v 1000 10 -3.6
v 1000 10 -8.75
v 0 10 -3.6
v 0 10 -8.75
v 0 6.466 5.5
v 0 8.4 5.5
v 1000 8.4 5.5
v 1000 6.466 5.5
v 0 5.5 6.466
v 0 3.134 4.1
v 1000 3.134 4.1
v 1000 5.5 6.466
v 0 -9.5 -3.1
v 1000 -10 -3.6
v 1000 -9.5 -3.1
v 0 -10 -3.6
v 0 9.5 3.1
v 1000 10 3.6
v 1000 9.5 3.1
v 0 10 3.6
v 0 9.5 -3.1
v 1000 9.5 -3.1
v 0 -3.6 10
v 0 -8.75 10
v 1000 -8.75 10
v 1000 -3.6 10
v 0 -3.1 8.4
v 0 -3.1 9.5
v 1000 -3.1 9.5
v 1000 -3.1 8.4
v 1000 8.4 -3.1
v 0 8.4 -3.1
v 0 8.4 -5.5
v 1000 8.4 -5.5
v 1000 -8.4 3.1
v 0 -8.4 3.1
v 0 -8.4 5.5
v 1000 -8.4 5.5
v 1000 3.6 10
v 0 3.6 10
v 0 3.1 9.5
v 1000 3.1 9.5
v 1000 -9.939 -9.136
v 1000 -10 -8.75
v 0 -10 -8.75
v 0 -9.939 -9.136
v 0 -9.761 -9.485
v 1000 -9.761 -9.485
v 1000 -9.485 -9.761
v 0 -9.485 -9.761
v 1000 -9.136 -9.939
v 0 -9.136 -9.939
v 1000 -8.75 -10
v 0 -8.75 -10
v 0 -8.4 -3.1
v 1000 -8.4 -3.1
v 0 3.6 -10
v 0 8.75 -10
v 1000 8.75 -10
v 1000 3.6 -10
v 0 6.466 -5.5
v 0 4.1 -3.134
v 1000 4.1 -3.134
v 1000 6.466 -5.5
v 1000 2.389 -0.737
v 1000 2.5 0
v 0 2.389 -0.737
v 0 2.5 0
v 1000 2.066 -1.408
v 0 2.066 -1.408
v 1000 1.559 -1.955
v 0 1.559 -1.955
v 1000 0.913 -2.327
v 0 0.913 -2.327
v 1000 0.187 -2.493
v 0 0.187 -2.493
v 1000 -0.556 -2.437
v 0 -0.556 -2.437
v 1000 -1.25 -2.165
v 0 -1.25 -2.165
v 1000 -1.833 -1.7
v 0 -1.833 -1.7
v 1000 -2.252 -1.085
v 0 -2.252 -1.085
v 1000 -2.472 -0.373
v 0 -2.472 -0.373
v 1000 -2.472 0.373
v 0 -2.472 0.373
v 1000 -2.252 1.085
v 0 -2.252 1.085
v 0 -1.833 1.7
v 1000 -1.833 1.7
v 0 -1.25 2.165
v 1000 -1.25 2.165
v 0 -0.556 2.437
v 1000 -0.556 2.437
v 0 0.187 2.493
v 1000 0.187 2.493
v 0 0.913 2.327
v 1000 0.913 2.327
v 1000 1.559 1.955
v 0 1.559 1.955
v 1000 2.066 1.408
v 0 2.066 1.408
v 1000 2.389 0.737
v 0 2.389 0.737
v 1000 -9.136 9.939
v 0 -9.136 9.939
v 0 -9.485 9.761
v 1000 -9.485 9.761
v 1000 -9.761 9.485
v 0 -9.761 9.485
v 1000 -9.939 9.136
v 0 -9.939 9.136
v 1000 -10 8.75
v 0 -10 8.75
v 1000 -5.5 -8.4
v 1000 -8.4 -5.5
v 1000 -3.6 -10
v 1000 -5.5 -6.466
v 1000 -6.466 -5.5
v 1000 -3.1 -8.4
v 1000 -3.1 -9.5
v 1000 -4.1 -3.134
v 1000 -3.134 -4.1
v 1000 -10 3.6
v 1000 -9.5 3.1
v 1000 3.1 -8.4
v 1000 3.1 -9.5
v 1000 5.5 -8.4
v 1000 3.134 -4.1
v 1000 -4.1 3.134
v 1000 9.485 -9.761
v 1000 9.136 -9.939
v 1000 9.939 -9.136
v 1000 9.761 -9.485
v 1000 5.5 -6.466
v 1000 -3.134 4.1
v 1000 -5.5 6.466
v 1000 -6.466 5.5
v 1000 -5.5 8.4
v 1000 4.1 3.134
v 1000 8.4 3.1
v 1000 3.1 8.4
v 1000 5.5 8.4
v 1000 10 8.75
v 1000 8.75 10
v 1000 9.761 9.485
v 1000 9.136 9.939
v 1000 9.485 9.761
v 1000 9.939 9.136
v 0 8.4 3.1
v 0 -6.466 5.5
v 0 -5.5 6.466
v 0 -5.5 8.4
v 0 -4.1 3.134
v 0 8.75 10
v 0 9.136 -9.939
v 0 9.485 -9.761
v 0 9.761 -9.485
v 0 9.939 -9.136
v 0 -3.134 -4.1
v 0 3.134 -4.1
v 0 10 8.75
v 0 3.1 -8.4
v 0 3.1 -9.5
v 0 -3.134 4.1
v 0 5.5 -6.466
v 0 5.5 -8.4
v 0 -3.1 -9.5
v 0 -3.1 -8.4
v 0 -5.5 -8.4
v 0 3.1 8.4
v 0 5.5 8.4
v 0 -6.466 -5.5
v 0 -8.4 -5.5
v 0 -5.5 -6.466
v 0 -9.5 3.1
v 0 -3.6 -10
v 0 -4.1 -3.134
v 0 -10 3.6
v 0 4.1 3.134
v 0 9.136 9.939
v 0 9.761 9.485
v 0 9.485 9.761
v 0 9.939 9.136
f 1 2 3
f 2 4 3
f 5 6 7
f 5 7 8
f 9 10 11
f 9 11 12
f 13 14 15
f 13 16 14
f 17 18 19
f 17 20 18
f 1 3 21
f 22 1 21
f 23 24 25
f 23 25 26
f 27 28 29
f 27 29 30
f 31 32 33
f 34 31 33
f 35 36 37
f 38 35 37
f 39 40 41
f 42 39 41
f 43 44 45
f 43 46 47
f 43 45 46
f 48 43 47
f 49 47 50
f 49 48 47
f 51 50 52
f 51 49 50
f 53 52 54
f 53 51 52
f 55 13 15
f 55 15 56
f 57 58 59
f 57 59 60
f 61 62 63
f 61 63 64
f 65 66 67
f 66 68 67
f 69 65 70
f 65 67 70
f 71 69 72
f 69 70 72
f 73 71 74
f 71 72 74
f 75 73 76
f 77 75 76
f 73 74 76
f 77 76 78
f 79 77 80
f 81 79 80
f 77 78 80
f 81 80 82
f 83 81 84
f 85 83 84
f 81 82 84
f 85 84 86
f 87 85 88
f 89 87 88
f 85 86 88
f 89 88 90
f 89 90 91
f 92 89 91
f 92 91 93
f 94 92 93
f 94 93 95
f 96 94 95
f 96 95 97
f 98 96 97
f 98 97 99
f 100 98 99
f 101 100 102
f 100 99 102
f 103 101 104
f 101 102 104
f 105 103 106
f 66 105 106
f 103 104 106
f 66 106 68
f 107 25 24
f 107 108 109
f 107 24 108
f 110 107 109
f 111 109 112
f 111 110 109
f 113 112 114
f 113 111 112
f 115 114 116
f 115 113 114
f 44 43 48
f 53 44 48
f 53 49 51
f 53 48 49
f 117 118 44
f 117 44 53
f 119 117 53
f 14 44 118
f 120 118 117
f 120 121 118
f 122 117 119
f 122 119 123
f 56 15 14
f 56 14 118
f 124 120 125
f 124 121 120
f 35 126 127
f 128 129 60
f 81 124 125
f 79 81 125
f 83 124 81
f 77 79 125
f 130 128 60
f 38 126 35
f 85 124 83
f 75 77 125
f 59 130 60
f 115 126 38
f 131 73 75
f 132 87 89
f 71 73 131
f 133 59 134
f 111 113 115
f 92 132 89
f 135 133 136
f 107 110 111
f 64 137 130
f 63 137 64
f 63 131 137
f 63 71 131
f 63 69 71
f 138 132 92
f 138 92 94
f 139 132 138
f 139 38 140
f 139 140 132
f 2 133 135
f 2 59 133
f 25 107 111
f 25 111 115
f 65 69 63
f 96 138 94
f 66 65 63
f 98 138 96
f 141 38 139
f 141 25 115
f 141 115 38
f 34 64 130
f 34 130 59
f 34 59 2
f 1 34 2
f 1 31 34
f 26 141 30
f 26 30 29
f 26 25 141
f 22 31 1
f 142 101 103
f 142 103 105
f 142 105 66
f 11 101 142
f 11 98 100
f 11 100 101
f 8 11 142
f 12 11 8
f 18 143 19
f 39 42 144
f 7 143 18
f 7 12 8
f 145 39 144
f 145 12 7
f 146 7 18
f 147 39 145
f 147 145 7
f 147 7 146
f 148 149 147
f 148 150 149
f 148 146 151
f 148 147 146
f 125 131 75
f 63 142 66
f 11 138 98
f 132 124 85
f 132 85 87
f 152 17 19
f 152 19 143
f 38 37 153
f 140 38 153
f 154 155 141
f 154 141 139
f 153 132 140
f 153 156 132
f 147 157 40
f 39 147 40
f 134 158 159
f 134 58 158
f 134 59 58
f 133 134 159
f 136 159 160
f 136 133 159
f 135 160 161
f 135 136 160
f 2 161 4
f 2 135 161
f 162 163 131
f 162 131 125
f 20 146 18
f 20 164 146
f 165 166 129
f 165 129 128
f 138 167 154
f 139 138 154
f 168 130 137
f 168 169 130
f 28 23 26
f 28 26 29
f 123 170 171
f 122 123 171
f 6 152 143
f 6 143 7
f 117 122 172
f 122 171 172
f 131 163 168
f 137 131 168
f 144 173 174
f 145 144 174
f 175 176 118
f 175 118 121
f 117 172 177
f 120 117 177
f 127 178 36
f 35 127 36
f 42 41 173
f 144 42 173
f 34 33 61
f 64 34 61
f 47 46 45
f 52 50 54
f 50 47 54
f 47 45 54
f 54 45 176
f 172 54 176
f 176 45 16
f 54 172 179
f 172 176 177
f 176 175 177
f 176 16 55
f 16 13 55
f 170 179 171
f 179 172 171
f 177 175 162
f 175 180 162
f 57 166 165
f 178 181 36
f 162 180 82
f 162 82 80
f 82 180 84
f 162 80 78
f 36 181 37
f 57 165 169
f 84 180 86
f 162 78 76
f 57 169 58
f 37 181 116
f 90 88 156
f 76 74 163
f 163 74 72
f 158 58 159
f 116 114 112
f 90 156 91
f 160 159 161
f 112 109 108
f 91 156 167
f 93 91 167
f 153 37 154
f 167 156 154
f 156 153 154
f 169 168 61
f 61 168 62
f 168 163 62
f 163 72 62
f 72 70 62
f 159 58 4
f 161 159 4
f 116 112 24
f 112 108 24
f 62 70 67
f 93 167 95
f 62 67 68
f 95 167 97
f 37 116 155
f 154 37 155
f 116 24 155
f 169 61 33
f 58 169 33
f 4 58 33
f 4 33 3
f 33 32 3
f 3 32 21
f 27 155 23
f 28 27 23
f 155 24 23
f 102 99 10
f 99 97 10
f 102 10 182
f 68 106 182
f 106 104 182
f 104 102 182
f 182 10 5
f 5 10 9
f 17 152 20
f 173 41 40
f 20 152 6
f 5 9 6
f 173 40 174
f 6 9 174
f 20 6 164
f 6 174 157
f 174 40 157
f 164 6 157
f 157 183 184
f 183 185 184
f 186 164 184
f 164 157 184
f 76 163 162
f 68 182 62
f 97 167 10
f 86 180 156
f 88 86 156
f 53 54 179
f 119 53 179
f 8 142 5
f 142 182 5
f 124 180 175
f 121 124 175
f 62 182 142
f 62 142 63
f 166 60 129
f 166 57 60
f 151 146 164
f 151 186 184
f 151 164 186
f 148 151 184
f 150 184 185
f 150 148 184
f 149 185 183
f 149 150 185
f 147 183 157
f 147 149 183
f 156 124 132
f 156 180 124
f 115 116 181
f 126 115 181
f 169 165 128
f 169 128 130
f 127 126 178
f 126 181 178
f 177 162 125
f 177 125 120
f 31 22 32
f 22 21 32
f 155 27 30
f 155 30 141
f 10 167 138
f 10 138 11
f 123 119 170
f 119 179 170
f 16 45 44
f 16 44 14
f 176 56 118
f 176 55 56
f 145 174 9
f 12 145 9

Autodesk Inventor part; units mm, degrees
ref_plane "YZ Plane" through (0, 0, 0) normal (1, 0, 0) x (0, 1, 0)
ref_plane "XZ Plane" through (0, 0, 0) normal (0, 1, 0) x (-1, 0, 0)
ref_plane "XY Plane" through (0, 0, 0) normal (0, 0, 1) x (1, 0, 0)
sketch "Sketch1" plane through (0, 0, 0) normal (1, 0, 0) x (0, 1, 0)
  circle A0 centre (0, 0) radius 2.5
  line L0 (0, 0) -> (10, 0)
  line L1 (10, -10) -> (10, -3.6)
  line L2 (10, -3.6) -> (9.5, -3.1)
  line L3 (9.5, -3.1) -> (8.4, -3.1)
  line L4 (8.4, -3.1) -> (8.4, -5.5)
  line L5 (-3.134, 4.1) -> (3.134, 4.1)
  line L6 (4.1, 3.134) -> (4.1, -3.134)
  line L7 (3.134, -4.1) -> (-3.134, -4.1)
  line L8 (-4.1, -3.134) -> (-4.1, 3.134)
  line L9 (-4.1, 4.1) -> (4.1, -4.1) construction
  line L10 (4.1, 4.1) -> (-4.1, -4.1) construction
  line L11 (4.1, -3.134) -> (6.466, -5.5)
  line L12 (8.4, -5.5) -> (6.466, -5.5)
  line L13 (10, -10) -> (3.6, -10)
  line L14 (3.6, -10) -> (3.1, -9.5)
  line L15 (3.1, -9.5) -> (3.1, -8.4)
  line L16 (3.1, -8.4) -> (5.5, -8.4)
  line L17 (3.134, -4.1) -> (5.5, -6.466)
  line L18 (5.5, -8.4) -> (5.5, -6.466)
  line L19 (10, 10) -> (10, 3.6)
  line L20 (10, 3.6) -> (9.5, 3.1)
  line L21 (9.5, 3.1) -> (8.4, 3.1)
  line L22 (8.4, 3.1) -> (8.4, 5.5)
  line L23 (4.1, 3.134) -> (6.466, 5.5)
  line L24 (8.4, 5.5) -> (6.466, 5.5)
  line L25 (5.5, 8.4) -> (5.5, 6.466)
  line L26 (3.134, 4.1) -> (5.5, 6.466)
  line L27 (3.1, 8.4) -> (5.5, 8.4)
  line L28 (3.1, 9.5) -> (3.1, 8.4)
  line L29 (3.6, 10) -> (3.1, 9.5)
  line L30 (10, 10) -> (3.6, 10)
  line L31 (0, 0) -> (0, -5.5)
  line L32 (-10, -10) -> (-10, -3.6)
  line L33 (-10, -3.6) -> (-9.5, -3.1)
  line L34 (-9.5, -3.1) -> (-8.4, -3.1)
  line L35 (-8.4, -3.1) -> (-8.4, -5.5)
  line L36 (-4.1, -3.134) -> (-6.466, -5.5)
  line L37 (-8.4, -5.5) -> (-6.466, -5.5)
  line L38 (-5.5, -8.4) -> (-5.5, -6.466)
  line L39 (-3.134, -4.1) -> (-5.5, -6.466)
  line L40 (-3.1, -8.4) -> (-5.5, -8.4)
  line L41 (-3.1, -9.5) -> (-3.1, -8.4)
  line L42 (-3.6, -10) -> (-3.1, -9.5)
  line L43 (-10, -10) -> (-3.6, -10)
  line L44 (-4.1, 3.134) -> (-6.466, 5.5)
  line L45 (-3.134, 4.1) -> (-5.5, 6.466)
  line L46 (-8.4, 3.1) -> (-8.4, 5.5)
  line L47 (-8.4, 5.5) -> (-6.466, 5.5)
  line L48 (-5.5, 8.4) -> (-5.5, 6.466)
  line L49 (-3.1, 8.4) -> (-5.5, 8.4)
  line L50 (-9.5, 3.1) -> (-8.4, 3.1)
  line L51 (-10, 3.6) -> (-9.5, 3.1)
  line L52 (-3.1, 9.5) -> (-3.1, 8.4)
  line L53 (-3.6, 10) -> (-3.1, 9.5)
  line L54 (-10, 10) -> (-3.6, 10)
  line L55 (-10, 10) -> (-10, 3.6)
  point P0 (-10, 0)
  dimension "d0" = 5
  dimension "d3" = 3.6
  dimension "d4" = 45
  dimension "d5" = 3.1
  dimension "d7" = 5.5
  dimension "d8" = 1.6
  dimension "d11" = 4.3
extrude "Extrusion1" add sketch "Sketch1" along normal blind 1000 contours L0 L6 L11 L12 L4 L3 L2 L1 L13 L14 L15 L16 L18 L17 L7 L31 A0 | A0 L31 L7 L39 L38 L40 L41 L42 L43 L32 L33 L34 L35 L37 L36 L8 L44 L47 L46 L50 L51 L55 L54 L53 L52 L49 L48 L45 L5 L26 L25 L27 L28 L29 L30 L19 L20 L21 L22 L24 L23 L6 L0
fillet "Fillet1" radius 1.25 4 edges at (500, 10, 10) (500, -10, 10) (500, 10, -10) (500, -10, -10)
properties part number "2020-1m"
